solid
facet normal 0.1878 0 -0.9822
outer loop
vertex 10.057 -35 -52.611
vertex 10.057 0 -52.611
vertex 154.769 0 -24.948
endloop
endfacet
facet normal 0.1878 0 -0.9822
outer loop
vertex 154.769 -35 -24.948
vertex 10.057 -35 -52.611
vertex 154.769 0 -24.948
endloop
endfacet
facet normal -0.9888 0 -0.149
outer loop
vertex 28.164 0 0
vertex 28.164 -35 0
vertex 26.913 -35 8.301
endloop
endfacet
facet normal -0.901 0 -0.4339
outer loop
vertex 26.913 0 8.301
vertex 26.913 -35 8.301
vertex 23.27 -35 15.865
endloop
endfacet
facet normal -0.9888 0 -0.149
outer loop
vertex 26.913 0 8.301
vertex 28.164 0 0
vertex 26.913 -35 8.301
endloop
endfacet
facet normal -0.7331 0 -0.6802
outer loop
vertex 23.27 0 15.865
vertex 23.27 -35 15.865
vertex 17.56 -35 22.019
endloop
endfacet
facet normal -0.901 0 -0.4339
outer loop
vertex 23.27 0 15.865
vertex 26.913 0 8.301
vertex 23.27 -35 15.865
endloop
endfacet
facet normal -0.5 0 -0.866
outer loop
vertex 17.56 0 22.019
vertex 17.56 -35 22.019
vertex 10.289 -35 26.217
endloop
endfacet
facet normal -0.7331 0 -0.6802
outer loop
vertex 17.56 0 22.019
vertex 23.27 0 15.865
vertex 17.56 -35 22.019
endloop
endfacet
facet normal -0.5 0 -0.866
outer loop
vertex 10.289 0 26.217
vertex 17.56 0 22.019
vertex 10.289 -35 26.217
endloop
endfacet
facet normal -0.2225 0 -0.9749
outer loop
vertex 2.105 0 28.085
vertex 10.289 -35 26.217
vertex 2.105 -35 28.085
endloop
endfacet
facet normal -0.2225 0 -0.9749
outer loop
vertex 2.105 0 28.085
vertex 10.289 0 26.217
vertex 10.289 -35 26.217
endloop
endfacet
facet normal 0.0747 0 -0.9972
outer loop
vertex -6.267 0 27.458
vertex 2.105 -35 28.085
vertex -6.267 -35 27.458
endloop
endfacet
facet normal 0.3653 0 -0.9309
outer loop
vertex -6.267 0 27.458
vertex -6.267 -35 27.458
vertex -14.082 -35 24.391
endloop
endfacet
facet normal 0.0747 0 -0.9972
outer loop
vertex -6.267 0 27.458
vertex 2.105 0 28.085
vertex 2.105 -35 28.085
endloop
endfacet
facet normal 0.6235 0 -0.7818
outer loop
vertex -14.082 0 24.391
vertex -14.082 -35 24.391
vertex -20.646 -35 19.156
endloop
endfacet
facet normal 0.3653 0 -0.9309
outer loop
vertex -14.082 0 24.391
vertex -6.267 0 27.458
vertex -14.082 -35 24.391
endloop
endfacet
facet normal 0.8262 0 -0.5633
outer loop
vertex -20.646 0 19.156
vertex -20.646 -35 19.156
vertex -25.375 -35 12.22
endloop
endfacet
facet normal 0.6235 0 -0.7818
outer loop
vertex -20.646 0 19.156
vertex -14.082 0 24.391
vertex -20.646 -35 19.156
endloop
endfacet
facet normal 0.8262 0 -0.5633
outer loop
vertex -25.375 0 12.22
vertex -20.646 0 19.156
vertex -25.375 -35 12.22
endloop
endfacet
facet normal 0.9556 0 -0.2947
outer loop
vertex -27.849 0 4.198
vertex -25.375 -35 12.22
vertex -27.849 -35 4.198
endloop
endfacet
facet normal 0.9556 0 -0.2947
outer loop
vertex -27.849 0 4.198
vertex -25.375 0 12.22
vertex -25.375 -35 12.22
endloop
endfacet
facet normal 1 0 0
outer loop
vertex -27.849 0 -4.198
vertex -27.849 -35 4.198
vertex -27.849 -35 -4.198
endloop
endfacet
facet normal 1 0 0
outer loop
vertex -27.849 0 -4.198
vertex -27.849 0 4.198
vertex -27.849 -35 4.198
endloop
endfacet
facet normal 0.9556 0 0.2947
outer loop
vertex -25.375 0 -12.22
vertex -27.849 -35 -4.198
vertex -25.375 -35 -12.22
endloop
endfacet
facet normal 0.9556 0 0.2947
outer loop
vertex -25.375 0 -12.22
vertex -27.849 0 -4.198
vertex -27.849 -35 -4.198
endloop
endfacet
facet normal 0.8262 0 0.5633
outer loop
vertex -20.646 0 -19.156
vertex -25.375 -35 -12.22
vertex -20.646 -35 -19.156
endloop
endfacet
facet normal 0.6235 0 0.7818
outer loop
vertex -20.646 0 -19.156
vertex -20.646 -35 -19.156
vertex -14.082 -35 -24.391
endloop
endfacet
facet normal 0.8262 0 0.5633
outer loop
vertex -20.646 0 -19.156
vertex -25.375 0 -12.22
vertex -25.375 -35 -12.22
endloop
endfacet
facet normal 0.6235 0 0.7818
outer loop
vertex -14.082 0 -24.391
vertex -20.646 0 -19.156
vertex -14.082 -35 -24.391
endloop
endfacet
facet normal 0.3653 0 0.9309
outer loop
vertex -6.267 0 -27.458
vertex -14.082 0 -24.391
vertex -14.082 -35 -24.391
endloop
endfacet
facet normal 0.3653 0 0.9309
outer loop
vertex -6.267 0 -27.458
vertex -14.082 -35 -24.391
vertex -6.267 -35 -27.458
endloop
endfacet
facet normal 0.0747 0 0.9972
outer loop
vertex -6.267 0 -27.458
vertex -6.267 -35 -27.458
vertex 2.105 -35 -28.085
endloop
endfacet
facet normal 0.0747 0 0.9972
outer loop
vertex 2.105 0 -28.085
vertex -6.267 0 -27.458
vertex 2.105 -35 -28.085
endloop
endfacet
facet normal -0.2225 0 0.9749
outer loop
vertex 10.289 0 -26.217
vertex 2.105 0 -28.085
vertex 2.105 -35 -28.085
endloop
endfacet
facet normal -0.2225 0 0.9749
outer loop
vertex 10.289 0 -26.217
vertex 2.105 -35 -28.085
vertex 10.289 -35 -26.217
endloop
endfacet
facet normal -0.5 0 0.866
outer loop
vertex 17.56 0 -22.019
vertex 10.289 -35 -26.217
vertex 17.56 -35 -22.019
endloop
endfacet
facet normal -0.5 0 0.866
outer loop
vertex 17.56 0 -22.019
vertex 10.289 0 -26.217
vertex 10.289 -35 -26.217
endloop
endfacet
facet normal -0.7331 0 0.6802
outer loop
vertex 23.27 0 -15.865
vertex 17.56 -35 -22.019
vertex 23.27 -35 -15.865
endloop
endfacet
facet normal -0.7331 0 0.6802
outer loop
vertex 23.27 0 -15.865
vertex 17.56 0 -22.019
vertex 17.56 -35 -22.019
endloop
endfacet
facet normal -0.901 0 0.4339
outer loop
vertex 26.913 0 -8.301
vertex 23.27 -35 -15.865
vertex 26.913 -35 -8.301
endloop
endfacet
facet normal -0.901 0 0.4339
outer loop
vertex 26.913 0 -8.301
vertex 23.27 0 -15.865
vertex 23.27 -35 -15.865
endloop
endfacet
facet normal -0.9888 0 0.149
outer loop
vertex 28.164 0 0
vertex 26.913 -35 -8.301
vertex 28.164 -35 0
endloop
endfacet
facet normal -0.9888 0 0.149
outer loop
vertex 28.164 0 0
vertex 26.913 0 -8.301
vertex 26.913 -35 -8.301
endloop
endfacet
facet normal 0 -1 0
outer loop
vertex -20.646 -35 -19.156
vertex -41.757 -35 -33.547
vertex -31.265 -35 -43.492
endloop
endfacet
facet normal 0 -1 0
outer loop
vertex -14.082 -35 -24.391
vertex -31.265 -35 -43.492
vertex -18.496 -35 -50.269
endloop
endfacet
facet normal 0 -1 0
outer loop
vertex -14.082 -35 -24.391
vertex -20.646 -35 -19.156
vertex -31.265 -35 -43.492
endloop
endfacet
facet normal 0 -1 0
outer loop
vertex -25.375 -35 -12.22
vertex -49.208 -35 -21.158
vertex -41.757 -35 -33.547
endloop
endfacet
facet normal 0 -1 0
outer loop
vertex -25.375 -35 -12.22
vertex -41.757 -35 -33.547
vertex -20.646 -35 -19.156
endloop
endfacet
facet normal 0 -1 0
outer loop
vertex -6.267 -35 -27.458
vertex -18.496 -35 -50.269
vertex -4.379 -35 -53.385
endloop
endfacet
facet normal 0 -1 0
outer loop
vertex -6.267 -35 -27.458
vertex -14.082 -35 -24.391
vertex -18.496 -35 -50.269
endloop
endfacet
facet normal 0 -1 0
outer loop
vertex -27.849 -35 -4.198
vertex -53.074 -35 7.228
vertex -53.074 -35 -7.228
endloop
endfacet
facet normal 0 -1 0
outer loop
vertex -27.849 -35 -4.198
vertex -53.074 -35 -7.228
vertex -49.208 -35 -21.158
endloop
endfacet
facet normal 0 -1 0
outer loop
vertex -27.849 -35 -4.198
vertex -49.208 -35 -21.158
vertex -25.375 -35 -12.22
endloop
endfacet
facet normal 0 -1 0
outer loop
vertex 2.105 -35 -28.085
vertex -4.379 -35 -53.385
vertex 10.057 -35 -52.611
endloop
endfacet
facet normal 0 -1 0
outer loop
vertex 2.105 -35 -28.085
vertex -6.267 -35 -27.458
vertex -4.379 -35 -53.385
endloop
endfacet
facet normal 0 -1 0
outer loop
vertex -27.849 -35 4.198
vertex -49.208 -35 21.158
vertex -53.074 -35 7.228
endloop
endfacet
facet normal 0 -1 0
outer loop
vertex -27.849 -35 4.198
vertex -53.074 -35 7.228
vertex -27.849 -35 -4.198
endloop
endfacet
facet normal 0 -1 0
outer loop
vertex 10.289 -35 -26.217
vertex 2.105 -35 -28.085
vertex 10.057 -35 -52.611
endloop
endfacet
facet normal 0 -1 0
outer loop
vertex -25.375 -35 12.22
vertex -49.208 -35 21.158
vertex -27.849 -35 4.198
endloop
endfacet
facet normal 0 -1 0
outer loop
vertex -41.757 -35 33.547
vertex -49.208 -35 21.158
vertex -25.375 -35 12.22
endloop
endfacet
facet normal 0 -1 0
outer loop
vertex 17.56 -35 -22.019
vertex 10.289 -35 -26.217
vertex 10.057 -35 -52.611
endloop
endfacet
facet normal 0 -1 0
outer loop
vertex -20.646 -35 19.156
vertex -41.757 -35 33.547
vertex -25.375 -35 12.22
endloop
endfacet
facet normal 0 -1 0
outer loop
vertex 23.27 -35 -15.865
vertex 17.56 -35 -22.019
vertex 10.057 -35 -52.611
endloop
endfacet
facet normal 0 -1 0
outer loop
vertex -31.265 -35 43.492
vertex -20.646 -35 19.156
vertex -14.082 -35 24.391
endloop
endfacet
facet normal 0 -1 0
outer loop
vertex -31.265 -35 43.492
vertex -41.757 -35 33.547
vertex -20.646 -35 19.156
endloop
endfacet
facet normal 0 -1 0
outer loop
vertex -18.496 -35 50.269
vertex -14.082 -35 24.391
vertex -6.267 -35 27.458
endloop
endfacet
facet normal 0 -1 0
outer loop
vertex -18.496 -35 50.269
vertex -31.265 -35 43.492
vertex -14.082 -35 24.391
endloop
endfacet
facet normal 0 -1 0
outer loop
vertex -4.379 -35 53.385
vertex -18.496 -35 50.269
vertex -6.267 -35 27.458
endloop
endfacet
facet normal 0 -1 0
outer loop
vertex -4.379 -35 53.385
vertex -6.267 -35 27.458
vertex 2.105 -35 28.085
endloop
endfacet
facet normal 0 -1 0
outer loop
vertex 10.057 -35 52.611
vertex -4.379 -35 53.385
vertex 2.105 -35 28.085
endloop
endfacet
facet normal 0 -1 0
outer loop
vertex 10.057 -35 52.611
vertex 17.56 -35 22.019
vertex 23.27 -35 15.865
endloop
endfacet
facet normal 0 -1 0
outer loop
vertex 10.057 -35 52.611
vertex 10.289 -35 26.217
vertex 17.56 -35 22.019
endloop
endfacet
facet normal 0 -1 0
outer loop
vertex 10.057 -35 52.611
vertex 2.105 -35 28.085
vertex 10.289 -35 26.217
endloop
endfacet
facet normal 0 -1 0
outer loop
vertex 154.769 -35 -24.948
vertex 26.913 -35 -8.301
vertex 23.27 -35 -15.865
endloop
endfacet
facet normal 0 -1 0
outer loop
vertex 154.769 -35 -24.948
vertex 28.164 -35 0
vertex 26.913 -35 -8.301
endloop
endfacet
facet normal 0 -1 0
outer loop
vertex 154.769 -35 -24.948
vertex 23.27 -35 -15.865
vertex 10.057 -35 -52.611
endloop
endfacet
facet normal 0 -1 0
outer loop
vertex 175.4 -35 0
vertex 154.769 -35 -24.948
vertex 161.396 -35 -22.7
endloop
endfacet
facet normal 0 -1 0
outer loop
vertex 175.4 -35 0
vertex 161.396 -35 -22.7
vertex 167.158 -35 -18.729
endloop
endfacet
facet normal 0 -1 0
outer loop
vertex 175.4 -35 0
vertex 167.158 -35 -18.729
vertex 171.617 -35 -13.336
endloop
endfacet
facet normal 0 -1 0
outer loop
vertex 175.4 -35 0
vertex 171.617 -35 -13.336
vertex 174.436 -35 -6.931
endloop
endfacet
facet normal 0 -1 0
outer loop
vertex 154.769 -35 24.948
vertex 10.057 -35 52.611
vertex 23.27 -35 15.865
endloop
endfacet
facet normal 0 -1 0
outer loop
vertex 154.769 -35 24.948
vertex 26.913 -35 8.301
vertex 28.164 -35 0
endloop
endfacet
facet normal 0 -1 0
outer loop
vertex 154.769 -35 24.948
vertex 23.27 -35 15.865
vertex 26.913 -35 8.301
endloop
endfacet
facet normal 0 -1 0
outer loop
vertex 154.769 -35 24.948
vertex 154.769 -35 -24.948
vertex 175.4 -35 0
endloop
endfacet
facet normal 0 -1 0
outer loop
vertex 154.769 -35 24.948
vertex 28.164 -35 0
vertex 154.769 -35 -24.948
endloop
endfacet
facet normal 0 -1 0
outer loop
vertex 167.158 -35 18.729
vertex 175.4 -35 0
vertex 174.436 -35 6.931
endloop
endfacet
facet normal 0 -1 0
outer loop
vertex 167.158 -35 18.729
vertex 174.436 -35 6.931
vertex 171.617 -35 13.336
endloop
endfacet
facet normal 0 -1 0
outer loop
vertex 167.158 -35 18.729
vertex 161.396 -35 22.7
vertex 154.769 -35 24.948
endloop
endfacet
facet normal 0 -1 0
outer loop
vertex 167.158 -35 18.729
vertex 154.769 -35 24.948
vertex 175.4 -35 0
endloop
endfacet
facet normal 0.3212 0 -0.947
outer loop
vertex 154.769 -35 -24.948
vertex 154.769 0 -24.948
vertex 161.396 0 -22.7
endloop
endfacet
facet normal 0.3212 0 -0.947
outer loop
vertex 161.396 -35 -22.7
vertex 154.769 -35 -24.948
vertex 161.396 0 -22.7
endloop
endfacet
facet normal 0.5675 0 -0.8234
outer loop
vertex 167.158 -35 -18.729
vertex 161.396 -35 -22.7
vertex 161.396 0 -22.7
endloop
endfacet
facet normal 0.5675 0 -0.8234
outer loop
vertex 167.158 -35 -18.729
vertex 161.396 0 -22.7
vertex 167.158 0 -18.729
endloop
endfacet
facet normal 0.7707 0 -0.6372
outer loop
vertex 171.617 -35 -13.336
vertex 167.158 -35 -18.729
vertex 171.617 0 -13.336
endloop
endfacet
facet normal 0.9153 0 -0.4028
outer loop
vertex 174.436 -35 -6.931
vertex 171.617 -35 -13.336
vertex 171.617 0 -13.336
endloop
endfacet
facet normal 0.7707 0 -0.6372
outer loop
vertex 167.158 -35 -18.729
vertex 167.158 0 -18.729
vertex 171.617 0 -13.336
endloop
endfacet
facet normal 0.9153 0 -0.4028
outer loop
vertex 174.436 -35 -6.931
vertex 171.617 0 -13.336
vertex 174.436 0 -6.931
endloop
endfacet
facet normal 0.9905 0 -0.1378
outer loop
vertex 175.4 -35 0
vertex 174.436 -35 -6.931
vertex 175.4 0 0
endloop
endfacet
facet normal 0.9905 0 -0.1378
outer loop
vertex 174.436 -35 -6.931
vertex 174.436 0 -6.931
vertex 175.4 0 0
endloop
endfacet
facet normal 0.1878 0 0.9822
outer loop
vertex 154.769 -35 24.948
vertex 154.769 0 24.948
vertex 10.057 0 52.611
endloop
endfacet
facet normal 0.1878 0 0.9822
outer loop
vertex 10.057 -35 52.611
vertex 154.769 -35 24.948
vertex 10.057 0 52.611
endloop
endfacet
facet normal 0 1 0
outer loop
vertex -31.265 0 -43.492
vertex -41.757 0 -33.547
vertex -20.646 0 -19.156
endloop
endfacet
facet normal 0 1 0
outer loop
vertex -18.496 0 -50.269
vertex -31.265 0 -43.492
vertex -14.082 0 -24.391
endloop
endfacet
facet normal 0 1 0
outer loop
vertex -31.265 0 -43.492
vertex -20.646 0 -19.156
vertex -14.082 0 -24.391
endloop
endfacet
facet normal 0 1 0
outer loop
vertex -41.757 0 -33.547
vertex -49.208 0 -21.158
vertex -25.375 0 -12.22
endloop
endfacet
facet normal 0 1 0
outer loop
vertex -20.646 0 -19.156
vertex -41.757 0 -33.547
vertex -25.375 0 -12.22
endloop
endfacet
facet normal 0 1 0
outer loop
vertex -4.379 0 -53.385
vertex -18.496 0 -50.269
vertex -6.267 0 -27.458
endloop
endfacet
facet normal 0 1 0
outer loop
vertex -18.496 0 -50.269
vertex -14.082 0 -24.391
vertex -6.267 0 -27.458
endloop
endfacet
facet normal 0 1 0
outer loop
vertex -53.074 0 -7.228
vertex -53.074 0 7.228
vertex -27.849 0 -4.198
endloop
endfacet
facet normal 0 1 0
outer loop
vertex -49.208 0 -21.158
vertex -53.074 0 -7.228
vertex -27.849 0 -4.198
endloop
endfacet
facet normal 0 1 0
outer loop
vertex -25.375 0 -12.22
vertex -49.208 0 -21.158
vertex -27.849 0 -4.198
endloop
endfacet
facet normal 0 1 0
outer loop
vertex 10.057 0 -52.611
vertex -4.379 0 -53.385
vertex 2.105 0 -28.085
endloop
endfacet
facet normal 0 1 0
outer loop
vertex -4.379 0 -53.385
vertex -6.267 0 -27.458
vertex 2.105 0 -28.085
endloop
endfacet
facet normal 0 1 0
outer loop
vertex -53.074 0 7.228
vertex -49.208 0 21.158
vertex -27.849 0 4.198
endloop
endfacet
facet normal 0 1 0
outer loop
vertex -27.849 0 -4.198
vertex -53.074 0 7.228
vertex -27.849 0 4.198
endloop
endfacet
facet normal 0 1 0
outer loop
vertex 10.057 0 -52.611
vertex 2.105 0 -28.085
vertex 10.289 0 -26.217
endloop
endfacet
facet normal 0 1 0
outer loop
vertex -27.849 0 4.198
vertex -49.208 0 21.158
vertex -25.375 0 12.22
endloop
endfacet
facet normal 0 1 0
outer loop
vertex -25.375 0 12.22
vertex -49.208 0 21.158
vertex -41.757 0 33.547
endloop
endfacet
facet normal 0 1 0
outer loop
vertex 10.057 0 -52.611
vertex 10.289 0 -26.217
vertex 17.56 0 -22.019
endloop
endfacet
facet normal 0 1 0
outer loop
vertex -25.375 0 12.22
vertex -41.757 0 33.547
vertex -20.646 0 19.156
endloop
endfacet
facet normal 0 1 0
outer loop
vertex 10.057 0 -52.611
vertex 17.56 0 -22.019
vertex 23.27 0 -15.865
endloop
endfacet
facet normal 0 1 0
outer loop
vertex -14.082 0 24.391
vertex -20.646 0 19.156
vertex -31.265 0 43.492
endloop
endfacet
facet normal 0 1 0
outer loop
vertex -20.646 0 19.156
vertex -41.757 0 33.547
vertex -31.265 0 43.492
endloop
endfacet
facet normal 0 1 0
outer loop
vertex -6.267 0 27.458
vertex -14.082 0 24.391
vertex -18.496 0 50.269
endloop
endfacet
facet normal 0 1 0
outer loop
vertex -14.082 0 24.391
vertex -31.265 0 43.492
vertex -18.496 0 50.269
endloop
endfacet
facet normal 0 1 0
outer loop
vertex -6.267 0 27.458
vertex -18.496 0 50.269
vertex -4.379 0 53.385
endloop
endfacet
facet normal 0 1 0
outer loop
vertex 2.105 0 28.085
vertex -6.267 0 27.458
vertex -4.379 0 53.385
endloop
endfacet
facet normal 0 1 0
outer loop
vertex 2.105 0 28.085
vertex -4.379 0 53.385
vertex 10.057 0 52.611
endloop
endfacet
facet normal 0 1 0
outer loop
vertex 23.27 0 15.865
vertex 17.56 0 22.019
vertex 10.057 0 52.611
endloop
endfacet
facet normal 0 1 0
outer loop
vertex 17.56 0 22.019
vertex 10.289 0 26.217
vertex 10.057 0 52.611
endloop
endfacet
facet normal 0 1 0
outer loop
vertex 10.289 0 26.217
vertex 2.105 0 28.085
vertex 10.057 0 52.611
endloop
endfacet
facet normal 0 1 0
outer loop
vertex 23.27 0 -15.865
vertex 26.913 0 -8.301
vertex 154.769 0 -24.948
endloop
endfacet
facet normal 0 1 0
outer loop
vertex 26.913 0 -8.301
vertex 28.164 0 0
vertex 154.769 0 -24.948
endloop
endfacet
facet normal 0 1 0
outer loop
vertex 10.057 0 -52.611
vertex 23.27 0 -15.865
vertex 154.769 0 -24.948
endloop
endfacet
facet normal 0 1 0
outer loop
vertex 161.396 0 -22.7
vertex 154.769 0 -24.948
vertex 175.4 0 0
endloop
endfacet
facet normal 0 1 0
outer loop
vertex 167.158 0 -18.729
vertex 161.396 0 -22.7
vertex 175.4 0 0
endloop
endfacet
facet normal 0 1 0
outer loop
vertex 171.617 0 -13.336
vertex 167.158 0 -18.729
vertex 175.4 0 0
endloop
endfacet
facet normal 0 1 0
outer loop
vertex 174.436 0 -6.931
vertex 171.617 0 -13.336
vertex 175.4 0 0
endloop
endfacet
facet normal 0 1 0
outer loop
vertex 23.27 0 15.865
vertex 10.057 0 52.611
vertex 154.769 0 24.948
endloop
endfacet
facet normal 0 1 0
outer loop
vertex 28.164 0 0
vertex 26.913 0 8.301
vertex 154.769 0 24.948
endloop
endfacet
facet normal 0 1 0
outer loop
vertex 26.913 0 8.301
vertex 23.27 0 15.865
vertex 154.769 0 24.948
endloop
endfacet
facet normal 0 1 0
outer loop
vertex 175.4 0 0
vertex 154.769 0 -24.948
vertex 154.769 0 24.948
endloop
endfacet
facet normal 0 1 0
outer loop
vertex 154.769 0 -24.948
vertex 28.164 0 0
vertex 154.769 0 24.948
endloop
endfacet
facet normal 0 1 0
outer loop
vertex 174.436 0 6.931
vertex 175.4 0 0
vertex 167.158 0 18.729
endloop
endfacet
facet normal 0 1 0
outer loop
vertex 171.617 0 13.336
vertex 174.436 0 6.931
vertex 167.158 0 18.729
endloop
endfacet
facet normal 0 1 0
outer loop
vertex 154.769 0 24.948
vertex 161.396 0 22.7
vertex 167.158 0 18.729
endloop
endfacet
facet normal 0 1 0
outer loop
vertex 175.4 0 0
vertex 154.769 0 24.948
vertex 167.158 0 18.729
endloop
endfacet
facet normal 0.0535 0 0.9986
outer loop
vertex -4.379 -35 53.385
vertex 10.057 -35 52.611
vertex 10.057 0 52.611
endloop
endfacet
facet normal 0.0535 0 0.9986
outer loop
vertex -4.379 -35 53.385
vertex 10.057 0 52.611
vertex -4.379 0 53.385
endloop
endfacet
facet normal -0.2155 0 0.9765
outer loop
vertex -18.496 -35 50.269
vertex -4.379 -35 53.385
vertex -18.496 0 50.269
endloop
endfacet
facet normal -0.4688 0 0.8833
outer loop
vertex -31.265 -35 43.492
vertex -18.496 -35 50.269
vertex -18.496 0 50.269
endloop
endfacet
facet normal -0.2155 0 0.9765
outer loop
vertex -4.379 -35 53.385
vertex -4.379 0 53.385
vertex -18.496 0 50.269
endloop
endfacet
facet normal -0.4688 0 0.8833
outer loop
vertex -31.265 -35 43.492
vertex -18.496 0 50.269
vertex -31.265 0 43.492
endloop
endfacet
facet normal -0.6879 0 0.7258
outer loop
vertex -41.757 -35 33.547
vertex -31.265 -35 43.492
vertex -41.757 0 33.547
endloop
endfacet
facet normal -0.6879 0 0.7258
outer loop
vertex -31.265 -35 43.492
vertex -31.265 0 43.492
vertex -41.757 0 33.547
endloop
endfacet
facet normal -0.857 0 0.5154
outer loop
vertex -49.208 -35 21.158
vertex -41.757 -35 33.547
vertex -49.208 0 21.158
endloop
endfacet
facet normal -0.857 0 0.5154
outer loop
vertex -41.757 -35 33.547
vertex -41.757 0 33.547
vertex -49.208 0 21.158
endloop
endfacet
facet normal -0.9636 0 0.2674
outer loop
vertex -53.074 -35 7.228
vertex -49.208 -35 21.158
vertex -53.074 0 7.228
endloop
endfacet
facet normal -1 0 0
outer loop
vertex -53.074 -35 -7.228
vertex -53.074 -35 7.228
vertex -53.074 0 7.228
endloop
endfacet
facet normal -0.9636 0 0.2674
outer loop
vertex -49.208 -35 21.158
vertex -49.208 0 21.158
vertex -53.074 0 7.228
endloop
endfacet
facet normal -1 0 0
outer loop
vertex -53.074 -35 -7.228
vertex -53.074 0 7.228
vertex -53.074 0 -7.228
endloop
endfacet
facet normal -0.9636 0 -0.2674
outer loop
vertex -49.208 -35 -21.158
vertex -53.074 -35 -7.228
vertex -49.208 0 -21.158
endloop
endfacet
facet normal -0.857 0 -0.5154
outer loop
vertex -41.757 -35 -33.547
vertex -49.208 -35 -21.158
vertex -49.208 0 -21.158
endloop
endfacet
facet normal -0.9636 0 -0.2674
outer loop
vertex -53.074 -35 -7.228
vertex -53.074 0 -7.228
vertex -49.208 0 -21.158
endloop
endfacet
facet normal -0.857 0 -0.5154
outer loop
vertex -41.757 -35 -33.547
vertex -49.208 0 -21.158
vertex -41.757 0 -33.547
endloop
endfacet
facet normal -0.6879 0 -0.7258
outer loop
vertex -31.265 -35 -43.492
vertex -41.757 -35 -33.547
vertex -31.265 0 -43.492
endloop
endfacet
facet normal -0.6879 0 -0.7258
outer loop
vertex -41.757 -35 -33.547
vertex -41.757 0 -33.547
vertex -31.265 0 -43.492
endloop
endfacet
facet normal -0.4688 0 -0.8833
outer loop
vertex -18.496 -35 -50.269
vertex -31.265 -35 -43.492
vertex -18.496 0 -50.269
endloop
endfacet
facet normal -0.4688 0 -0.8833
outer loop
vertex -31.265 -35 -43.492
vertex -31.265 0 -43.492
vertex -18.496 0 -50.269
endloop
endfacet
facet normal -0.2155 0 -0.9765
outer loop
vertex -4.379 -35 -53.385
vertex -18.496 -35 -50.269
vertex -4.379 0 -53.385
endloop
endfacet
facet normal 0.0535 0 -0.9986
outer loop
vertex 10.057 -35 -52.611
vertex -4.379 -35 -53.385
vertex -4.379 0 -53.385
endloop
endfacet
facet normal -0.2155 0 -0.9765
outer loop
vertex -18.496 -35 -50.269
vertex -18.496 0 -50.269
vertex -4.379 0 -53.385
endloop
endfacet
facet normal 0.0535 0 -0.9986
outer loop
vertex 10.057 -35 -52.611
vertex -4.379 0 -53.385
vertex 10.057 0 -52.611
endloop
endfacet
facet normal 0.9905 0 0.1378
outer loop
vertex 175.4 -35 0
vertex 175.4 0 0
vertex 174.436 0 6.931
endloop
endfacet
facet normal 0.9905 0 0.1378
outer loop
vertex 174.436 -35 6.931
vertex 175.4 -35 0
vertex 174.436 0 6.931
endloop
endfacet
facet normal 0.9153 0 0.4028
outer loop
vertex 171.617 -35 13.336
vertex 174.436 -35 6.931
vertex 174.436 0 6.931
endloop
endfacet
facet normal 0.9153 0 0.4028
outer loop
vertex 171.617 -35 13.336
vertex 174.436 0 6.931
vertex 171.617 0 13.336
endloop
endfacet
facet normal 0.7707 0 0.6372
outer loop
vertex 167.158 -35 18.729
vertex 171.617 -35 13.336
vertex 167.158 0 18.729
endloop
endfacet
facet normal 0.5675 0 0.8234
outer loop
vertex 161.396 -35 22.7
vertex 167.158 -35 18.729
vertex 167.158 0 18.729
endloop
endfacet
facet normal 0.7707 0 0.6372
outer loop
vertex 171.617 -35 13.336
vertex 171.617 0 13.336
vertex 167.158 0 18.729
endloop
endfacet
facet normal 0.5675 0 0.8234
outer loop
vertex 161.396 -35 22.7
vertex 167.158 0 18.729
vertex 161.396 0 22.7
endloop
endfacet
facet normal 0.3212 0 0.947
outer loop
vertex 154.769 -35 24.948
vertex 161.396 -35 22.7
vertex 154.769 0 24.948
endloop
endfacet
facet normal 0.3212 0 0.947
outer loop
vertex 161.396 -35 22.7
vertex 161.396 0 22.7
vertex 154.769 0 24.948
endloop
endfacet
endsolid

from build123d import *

# Parameters (mm, degrees)
F0_R     = 28.1638511083
F1_DEPTH = 35


# Not quite as in the source:
# - the program builds the solid bodies; features that only make, move or delete a surface that nothing else refers to are left out


with BuildPart() as f1:
    # F0 (on Front) → F1 (new body)
    with BuildSketch(Plane.XZ):
        with BuildLine():
            ThreePointArc((10.057095516, 52.6112248036), (41.2782201188, 34.1349482111), (53.5638511083, 0))
            ThreePointArc((53.5638511083, 0), (41.2782201188, -34.1349482111), (10.057095516, -52.6112248036))
            Line((10.057095516, -52.6112248036), (154.7690787877, -24.9482642185))
            ThreePointArc((154.7690787877, -24.9482642185), (124.6, 0), (154.7690787877, 24.9482642185))
            Line((154.7690787877, 24.9482642185), (10.057095516, 52.6112248036))
        make_face()
        with BuildLine():
            ThreePointArc((10.057095516, -52.6112248036), (41.2782201188, -34.1349482111), (53.5638511083, 0))
            ThreePointArc((53.5638511083, 0), (41.2782201188, 34.1349482111), (10.057095516, 52.6112248036))
            ThreePointArc((10.057095516, 52.6112248036), (-53.5638511083, 0), (10.057095516, -52.6112248036))
        make_face()
        Circle(F0_R, mode=Mode.SUBTRACT)
        with BuildLine():
            ThreePointArc((175.4, 0), (169.5741487836, 16.1868063372), (154.7690787877, 24.9482642185))
            ThreePointArc((154.7690787877, 24.9482642185), (124.6, 0), (154.7690787877, -24.9482642185))
            ThreePointArc((154.7690787877, -24.9482642185), (169.5741487836, -16.1868063372), (175.4, 0))
        make_face()
    extrude(amount=F1_DEPTH)


solid = f1.part
